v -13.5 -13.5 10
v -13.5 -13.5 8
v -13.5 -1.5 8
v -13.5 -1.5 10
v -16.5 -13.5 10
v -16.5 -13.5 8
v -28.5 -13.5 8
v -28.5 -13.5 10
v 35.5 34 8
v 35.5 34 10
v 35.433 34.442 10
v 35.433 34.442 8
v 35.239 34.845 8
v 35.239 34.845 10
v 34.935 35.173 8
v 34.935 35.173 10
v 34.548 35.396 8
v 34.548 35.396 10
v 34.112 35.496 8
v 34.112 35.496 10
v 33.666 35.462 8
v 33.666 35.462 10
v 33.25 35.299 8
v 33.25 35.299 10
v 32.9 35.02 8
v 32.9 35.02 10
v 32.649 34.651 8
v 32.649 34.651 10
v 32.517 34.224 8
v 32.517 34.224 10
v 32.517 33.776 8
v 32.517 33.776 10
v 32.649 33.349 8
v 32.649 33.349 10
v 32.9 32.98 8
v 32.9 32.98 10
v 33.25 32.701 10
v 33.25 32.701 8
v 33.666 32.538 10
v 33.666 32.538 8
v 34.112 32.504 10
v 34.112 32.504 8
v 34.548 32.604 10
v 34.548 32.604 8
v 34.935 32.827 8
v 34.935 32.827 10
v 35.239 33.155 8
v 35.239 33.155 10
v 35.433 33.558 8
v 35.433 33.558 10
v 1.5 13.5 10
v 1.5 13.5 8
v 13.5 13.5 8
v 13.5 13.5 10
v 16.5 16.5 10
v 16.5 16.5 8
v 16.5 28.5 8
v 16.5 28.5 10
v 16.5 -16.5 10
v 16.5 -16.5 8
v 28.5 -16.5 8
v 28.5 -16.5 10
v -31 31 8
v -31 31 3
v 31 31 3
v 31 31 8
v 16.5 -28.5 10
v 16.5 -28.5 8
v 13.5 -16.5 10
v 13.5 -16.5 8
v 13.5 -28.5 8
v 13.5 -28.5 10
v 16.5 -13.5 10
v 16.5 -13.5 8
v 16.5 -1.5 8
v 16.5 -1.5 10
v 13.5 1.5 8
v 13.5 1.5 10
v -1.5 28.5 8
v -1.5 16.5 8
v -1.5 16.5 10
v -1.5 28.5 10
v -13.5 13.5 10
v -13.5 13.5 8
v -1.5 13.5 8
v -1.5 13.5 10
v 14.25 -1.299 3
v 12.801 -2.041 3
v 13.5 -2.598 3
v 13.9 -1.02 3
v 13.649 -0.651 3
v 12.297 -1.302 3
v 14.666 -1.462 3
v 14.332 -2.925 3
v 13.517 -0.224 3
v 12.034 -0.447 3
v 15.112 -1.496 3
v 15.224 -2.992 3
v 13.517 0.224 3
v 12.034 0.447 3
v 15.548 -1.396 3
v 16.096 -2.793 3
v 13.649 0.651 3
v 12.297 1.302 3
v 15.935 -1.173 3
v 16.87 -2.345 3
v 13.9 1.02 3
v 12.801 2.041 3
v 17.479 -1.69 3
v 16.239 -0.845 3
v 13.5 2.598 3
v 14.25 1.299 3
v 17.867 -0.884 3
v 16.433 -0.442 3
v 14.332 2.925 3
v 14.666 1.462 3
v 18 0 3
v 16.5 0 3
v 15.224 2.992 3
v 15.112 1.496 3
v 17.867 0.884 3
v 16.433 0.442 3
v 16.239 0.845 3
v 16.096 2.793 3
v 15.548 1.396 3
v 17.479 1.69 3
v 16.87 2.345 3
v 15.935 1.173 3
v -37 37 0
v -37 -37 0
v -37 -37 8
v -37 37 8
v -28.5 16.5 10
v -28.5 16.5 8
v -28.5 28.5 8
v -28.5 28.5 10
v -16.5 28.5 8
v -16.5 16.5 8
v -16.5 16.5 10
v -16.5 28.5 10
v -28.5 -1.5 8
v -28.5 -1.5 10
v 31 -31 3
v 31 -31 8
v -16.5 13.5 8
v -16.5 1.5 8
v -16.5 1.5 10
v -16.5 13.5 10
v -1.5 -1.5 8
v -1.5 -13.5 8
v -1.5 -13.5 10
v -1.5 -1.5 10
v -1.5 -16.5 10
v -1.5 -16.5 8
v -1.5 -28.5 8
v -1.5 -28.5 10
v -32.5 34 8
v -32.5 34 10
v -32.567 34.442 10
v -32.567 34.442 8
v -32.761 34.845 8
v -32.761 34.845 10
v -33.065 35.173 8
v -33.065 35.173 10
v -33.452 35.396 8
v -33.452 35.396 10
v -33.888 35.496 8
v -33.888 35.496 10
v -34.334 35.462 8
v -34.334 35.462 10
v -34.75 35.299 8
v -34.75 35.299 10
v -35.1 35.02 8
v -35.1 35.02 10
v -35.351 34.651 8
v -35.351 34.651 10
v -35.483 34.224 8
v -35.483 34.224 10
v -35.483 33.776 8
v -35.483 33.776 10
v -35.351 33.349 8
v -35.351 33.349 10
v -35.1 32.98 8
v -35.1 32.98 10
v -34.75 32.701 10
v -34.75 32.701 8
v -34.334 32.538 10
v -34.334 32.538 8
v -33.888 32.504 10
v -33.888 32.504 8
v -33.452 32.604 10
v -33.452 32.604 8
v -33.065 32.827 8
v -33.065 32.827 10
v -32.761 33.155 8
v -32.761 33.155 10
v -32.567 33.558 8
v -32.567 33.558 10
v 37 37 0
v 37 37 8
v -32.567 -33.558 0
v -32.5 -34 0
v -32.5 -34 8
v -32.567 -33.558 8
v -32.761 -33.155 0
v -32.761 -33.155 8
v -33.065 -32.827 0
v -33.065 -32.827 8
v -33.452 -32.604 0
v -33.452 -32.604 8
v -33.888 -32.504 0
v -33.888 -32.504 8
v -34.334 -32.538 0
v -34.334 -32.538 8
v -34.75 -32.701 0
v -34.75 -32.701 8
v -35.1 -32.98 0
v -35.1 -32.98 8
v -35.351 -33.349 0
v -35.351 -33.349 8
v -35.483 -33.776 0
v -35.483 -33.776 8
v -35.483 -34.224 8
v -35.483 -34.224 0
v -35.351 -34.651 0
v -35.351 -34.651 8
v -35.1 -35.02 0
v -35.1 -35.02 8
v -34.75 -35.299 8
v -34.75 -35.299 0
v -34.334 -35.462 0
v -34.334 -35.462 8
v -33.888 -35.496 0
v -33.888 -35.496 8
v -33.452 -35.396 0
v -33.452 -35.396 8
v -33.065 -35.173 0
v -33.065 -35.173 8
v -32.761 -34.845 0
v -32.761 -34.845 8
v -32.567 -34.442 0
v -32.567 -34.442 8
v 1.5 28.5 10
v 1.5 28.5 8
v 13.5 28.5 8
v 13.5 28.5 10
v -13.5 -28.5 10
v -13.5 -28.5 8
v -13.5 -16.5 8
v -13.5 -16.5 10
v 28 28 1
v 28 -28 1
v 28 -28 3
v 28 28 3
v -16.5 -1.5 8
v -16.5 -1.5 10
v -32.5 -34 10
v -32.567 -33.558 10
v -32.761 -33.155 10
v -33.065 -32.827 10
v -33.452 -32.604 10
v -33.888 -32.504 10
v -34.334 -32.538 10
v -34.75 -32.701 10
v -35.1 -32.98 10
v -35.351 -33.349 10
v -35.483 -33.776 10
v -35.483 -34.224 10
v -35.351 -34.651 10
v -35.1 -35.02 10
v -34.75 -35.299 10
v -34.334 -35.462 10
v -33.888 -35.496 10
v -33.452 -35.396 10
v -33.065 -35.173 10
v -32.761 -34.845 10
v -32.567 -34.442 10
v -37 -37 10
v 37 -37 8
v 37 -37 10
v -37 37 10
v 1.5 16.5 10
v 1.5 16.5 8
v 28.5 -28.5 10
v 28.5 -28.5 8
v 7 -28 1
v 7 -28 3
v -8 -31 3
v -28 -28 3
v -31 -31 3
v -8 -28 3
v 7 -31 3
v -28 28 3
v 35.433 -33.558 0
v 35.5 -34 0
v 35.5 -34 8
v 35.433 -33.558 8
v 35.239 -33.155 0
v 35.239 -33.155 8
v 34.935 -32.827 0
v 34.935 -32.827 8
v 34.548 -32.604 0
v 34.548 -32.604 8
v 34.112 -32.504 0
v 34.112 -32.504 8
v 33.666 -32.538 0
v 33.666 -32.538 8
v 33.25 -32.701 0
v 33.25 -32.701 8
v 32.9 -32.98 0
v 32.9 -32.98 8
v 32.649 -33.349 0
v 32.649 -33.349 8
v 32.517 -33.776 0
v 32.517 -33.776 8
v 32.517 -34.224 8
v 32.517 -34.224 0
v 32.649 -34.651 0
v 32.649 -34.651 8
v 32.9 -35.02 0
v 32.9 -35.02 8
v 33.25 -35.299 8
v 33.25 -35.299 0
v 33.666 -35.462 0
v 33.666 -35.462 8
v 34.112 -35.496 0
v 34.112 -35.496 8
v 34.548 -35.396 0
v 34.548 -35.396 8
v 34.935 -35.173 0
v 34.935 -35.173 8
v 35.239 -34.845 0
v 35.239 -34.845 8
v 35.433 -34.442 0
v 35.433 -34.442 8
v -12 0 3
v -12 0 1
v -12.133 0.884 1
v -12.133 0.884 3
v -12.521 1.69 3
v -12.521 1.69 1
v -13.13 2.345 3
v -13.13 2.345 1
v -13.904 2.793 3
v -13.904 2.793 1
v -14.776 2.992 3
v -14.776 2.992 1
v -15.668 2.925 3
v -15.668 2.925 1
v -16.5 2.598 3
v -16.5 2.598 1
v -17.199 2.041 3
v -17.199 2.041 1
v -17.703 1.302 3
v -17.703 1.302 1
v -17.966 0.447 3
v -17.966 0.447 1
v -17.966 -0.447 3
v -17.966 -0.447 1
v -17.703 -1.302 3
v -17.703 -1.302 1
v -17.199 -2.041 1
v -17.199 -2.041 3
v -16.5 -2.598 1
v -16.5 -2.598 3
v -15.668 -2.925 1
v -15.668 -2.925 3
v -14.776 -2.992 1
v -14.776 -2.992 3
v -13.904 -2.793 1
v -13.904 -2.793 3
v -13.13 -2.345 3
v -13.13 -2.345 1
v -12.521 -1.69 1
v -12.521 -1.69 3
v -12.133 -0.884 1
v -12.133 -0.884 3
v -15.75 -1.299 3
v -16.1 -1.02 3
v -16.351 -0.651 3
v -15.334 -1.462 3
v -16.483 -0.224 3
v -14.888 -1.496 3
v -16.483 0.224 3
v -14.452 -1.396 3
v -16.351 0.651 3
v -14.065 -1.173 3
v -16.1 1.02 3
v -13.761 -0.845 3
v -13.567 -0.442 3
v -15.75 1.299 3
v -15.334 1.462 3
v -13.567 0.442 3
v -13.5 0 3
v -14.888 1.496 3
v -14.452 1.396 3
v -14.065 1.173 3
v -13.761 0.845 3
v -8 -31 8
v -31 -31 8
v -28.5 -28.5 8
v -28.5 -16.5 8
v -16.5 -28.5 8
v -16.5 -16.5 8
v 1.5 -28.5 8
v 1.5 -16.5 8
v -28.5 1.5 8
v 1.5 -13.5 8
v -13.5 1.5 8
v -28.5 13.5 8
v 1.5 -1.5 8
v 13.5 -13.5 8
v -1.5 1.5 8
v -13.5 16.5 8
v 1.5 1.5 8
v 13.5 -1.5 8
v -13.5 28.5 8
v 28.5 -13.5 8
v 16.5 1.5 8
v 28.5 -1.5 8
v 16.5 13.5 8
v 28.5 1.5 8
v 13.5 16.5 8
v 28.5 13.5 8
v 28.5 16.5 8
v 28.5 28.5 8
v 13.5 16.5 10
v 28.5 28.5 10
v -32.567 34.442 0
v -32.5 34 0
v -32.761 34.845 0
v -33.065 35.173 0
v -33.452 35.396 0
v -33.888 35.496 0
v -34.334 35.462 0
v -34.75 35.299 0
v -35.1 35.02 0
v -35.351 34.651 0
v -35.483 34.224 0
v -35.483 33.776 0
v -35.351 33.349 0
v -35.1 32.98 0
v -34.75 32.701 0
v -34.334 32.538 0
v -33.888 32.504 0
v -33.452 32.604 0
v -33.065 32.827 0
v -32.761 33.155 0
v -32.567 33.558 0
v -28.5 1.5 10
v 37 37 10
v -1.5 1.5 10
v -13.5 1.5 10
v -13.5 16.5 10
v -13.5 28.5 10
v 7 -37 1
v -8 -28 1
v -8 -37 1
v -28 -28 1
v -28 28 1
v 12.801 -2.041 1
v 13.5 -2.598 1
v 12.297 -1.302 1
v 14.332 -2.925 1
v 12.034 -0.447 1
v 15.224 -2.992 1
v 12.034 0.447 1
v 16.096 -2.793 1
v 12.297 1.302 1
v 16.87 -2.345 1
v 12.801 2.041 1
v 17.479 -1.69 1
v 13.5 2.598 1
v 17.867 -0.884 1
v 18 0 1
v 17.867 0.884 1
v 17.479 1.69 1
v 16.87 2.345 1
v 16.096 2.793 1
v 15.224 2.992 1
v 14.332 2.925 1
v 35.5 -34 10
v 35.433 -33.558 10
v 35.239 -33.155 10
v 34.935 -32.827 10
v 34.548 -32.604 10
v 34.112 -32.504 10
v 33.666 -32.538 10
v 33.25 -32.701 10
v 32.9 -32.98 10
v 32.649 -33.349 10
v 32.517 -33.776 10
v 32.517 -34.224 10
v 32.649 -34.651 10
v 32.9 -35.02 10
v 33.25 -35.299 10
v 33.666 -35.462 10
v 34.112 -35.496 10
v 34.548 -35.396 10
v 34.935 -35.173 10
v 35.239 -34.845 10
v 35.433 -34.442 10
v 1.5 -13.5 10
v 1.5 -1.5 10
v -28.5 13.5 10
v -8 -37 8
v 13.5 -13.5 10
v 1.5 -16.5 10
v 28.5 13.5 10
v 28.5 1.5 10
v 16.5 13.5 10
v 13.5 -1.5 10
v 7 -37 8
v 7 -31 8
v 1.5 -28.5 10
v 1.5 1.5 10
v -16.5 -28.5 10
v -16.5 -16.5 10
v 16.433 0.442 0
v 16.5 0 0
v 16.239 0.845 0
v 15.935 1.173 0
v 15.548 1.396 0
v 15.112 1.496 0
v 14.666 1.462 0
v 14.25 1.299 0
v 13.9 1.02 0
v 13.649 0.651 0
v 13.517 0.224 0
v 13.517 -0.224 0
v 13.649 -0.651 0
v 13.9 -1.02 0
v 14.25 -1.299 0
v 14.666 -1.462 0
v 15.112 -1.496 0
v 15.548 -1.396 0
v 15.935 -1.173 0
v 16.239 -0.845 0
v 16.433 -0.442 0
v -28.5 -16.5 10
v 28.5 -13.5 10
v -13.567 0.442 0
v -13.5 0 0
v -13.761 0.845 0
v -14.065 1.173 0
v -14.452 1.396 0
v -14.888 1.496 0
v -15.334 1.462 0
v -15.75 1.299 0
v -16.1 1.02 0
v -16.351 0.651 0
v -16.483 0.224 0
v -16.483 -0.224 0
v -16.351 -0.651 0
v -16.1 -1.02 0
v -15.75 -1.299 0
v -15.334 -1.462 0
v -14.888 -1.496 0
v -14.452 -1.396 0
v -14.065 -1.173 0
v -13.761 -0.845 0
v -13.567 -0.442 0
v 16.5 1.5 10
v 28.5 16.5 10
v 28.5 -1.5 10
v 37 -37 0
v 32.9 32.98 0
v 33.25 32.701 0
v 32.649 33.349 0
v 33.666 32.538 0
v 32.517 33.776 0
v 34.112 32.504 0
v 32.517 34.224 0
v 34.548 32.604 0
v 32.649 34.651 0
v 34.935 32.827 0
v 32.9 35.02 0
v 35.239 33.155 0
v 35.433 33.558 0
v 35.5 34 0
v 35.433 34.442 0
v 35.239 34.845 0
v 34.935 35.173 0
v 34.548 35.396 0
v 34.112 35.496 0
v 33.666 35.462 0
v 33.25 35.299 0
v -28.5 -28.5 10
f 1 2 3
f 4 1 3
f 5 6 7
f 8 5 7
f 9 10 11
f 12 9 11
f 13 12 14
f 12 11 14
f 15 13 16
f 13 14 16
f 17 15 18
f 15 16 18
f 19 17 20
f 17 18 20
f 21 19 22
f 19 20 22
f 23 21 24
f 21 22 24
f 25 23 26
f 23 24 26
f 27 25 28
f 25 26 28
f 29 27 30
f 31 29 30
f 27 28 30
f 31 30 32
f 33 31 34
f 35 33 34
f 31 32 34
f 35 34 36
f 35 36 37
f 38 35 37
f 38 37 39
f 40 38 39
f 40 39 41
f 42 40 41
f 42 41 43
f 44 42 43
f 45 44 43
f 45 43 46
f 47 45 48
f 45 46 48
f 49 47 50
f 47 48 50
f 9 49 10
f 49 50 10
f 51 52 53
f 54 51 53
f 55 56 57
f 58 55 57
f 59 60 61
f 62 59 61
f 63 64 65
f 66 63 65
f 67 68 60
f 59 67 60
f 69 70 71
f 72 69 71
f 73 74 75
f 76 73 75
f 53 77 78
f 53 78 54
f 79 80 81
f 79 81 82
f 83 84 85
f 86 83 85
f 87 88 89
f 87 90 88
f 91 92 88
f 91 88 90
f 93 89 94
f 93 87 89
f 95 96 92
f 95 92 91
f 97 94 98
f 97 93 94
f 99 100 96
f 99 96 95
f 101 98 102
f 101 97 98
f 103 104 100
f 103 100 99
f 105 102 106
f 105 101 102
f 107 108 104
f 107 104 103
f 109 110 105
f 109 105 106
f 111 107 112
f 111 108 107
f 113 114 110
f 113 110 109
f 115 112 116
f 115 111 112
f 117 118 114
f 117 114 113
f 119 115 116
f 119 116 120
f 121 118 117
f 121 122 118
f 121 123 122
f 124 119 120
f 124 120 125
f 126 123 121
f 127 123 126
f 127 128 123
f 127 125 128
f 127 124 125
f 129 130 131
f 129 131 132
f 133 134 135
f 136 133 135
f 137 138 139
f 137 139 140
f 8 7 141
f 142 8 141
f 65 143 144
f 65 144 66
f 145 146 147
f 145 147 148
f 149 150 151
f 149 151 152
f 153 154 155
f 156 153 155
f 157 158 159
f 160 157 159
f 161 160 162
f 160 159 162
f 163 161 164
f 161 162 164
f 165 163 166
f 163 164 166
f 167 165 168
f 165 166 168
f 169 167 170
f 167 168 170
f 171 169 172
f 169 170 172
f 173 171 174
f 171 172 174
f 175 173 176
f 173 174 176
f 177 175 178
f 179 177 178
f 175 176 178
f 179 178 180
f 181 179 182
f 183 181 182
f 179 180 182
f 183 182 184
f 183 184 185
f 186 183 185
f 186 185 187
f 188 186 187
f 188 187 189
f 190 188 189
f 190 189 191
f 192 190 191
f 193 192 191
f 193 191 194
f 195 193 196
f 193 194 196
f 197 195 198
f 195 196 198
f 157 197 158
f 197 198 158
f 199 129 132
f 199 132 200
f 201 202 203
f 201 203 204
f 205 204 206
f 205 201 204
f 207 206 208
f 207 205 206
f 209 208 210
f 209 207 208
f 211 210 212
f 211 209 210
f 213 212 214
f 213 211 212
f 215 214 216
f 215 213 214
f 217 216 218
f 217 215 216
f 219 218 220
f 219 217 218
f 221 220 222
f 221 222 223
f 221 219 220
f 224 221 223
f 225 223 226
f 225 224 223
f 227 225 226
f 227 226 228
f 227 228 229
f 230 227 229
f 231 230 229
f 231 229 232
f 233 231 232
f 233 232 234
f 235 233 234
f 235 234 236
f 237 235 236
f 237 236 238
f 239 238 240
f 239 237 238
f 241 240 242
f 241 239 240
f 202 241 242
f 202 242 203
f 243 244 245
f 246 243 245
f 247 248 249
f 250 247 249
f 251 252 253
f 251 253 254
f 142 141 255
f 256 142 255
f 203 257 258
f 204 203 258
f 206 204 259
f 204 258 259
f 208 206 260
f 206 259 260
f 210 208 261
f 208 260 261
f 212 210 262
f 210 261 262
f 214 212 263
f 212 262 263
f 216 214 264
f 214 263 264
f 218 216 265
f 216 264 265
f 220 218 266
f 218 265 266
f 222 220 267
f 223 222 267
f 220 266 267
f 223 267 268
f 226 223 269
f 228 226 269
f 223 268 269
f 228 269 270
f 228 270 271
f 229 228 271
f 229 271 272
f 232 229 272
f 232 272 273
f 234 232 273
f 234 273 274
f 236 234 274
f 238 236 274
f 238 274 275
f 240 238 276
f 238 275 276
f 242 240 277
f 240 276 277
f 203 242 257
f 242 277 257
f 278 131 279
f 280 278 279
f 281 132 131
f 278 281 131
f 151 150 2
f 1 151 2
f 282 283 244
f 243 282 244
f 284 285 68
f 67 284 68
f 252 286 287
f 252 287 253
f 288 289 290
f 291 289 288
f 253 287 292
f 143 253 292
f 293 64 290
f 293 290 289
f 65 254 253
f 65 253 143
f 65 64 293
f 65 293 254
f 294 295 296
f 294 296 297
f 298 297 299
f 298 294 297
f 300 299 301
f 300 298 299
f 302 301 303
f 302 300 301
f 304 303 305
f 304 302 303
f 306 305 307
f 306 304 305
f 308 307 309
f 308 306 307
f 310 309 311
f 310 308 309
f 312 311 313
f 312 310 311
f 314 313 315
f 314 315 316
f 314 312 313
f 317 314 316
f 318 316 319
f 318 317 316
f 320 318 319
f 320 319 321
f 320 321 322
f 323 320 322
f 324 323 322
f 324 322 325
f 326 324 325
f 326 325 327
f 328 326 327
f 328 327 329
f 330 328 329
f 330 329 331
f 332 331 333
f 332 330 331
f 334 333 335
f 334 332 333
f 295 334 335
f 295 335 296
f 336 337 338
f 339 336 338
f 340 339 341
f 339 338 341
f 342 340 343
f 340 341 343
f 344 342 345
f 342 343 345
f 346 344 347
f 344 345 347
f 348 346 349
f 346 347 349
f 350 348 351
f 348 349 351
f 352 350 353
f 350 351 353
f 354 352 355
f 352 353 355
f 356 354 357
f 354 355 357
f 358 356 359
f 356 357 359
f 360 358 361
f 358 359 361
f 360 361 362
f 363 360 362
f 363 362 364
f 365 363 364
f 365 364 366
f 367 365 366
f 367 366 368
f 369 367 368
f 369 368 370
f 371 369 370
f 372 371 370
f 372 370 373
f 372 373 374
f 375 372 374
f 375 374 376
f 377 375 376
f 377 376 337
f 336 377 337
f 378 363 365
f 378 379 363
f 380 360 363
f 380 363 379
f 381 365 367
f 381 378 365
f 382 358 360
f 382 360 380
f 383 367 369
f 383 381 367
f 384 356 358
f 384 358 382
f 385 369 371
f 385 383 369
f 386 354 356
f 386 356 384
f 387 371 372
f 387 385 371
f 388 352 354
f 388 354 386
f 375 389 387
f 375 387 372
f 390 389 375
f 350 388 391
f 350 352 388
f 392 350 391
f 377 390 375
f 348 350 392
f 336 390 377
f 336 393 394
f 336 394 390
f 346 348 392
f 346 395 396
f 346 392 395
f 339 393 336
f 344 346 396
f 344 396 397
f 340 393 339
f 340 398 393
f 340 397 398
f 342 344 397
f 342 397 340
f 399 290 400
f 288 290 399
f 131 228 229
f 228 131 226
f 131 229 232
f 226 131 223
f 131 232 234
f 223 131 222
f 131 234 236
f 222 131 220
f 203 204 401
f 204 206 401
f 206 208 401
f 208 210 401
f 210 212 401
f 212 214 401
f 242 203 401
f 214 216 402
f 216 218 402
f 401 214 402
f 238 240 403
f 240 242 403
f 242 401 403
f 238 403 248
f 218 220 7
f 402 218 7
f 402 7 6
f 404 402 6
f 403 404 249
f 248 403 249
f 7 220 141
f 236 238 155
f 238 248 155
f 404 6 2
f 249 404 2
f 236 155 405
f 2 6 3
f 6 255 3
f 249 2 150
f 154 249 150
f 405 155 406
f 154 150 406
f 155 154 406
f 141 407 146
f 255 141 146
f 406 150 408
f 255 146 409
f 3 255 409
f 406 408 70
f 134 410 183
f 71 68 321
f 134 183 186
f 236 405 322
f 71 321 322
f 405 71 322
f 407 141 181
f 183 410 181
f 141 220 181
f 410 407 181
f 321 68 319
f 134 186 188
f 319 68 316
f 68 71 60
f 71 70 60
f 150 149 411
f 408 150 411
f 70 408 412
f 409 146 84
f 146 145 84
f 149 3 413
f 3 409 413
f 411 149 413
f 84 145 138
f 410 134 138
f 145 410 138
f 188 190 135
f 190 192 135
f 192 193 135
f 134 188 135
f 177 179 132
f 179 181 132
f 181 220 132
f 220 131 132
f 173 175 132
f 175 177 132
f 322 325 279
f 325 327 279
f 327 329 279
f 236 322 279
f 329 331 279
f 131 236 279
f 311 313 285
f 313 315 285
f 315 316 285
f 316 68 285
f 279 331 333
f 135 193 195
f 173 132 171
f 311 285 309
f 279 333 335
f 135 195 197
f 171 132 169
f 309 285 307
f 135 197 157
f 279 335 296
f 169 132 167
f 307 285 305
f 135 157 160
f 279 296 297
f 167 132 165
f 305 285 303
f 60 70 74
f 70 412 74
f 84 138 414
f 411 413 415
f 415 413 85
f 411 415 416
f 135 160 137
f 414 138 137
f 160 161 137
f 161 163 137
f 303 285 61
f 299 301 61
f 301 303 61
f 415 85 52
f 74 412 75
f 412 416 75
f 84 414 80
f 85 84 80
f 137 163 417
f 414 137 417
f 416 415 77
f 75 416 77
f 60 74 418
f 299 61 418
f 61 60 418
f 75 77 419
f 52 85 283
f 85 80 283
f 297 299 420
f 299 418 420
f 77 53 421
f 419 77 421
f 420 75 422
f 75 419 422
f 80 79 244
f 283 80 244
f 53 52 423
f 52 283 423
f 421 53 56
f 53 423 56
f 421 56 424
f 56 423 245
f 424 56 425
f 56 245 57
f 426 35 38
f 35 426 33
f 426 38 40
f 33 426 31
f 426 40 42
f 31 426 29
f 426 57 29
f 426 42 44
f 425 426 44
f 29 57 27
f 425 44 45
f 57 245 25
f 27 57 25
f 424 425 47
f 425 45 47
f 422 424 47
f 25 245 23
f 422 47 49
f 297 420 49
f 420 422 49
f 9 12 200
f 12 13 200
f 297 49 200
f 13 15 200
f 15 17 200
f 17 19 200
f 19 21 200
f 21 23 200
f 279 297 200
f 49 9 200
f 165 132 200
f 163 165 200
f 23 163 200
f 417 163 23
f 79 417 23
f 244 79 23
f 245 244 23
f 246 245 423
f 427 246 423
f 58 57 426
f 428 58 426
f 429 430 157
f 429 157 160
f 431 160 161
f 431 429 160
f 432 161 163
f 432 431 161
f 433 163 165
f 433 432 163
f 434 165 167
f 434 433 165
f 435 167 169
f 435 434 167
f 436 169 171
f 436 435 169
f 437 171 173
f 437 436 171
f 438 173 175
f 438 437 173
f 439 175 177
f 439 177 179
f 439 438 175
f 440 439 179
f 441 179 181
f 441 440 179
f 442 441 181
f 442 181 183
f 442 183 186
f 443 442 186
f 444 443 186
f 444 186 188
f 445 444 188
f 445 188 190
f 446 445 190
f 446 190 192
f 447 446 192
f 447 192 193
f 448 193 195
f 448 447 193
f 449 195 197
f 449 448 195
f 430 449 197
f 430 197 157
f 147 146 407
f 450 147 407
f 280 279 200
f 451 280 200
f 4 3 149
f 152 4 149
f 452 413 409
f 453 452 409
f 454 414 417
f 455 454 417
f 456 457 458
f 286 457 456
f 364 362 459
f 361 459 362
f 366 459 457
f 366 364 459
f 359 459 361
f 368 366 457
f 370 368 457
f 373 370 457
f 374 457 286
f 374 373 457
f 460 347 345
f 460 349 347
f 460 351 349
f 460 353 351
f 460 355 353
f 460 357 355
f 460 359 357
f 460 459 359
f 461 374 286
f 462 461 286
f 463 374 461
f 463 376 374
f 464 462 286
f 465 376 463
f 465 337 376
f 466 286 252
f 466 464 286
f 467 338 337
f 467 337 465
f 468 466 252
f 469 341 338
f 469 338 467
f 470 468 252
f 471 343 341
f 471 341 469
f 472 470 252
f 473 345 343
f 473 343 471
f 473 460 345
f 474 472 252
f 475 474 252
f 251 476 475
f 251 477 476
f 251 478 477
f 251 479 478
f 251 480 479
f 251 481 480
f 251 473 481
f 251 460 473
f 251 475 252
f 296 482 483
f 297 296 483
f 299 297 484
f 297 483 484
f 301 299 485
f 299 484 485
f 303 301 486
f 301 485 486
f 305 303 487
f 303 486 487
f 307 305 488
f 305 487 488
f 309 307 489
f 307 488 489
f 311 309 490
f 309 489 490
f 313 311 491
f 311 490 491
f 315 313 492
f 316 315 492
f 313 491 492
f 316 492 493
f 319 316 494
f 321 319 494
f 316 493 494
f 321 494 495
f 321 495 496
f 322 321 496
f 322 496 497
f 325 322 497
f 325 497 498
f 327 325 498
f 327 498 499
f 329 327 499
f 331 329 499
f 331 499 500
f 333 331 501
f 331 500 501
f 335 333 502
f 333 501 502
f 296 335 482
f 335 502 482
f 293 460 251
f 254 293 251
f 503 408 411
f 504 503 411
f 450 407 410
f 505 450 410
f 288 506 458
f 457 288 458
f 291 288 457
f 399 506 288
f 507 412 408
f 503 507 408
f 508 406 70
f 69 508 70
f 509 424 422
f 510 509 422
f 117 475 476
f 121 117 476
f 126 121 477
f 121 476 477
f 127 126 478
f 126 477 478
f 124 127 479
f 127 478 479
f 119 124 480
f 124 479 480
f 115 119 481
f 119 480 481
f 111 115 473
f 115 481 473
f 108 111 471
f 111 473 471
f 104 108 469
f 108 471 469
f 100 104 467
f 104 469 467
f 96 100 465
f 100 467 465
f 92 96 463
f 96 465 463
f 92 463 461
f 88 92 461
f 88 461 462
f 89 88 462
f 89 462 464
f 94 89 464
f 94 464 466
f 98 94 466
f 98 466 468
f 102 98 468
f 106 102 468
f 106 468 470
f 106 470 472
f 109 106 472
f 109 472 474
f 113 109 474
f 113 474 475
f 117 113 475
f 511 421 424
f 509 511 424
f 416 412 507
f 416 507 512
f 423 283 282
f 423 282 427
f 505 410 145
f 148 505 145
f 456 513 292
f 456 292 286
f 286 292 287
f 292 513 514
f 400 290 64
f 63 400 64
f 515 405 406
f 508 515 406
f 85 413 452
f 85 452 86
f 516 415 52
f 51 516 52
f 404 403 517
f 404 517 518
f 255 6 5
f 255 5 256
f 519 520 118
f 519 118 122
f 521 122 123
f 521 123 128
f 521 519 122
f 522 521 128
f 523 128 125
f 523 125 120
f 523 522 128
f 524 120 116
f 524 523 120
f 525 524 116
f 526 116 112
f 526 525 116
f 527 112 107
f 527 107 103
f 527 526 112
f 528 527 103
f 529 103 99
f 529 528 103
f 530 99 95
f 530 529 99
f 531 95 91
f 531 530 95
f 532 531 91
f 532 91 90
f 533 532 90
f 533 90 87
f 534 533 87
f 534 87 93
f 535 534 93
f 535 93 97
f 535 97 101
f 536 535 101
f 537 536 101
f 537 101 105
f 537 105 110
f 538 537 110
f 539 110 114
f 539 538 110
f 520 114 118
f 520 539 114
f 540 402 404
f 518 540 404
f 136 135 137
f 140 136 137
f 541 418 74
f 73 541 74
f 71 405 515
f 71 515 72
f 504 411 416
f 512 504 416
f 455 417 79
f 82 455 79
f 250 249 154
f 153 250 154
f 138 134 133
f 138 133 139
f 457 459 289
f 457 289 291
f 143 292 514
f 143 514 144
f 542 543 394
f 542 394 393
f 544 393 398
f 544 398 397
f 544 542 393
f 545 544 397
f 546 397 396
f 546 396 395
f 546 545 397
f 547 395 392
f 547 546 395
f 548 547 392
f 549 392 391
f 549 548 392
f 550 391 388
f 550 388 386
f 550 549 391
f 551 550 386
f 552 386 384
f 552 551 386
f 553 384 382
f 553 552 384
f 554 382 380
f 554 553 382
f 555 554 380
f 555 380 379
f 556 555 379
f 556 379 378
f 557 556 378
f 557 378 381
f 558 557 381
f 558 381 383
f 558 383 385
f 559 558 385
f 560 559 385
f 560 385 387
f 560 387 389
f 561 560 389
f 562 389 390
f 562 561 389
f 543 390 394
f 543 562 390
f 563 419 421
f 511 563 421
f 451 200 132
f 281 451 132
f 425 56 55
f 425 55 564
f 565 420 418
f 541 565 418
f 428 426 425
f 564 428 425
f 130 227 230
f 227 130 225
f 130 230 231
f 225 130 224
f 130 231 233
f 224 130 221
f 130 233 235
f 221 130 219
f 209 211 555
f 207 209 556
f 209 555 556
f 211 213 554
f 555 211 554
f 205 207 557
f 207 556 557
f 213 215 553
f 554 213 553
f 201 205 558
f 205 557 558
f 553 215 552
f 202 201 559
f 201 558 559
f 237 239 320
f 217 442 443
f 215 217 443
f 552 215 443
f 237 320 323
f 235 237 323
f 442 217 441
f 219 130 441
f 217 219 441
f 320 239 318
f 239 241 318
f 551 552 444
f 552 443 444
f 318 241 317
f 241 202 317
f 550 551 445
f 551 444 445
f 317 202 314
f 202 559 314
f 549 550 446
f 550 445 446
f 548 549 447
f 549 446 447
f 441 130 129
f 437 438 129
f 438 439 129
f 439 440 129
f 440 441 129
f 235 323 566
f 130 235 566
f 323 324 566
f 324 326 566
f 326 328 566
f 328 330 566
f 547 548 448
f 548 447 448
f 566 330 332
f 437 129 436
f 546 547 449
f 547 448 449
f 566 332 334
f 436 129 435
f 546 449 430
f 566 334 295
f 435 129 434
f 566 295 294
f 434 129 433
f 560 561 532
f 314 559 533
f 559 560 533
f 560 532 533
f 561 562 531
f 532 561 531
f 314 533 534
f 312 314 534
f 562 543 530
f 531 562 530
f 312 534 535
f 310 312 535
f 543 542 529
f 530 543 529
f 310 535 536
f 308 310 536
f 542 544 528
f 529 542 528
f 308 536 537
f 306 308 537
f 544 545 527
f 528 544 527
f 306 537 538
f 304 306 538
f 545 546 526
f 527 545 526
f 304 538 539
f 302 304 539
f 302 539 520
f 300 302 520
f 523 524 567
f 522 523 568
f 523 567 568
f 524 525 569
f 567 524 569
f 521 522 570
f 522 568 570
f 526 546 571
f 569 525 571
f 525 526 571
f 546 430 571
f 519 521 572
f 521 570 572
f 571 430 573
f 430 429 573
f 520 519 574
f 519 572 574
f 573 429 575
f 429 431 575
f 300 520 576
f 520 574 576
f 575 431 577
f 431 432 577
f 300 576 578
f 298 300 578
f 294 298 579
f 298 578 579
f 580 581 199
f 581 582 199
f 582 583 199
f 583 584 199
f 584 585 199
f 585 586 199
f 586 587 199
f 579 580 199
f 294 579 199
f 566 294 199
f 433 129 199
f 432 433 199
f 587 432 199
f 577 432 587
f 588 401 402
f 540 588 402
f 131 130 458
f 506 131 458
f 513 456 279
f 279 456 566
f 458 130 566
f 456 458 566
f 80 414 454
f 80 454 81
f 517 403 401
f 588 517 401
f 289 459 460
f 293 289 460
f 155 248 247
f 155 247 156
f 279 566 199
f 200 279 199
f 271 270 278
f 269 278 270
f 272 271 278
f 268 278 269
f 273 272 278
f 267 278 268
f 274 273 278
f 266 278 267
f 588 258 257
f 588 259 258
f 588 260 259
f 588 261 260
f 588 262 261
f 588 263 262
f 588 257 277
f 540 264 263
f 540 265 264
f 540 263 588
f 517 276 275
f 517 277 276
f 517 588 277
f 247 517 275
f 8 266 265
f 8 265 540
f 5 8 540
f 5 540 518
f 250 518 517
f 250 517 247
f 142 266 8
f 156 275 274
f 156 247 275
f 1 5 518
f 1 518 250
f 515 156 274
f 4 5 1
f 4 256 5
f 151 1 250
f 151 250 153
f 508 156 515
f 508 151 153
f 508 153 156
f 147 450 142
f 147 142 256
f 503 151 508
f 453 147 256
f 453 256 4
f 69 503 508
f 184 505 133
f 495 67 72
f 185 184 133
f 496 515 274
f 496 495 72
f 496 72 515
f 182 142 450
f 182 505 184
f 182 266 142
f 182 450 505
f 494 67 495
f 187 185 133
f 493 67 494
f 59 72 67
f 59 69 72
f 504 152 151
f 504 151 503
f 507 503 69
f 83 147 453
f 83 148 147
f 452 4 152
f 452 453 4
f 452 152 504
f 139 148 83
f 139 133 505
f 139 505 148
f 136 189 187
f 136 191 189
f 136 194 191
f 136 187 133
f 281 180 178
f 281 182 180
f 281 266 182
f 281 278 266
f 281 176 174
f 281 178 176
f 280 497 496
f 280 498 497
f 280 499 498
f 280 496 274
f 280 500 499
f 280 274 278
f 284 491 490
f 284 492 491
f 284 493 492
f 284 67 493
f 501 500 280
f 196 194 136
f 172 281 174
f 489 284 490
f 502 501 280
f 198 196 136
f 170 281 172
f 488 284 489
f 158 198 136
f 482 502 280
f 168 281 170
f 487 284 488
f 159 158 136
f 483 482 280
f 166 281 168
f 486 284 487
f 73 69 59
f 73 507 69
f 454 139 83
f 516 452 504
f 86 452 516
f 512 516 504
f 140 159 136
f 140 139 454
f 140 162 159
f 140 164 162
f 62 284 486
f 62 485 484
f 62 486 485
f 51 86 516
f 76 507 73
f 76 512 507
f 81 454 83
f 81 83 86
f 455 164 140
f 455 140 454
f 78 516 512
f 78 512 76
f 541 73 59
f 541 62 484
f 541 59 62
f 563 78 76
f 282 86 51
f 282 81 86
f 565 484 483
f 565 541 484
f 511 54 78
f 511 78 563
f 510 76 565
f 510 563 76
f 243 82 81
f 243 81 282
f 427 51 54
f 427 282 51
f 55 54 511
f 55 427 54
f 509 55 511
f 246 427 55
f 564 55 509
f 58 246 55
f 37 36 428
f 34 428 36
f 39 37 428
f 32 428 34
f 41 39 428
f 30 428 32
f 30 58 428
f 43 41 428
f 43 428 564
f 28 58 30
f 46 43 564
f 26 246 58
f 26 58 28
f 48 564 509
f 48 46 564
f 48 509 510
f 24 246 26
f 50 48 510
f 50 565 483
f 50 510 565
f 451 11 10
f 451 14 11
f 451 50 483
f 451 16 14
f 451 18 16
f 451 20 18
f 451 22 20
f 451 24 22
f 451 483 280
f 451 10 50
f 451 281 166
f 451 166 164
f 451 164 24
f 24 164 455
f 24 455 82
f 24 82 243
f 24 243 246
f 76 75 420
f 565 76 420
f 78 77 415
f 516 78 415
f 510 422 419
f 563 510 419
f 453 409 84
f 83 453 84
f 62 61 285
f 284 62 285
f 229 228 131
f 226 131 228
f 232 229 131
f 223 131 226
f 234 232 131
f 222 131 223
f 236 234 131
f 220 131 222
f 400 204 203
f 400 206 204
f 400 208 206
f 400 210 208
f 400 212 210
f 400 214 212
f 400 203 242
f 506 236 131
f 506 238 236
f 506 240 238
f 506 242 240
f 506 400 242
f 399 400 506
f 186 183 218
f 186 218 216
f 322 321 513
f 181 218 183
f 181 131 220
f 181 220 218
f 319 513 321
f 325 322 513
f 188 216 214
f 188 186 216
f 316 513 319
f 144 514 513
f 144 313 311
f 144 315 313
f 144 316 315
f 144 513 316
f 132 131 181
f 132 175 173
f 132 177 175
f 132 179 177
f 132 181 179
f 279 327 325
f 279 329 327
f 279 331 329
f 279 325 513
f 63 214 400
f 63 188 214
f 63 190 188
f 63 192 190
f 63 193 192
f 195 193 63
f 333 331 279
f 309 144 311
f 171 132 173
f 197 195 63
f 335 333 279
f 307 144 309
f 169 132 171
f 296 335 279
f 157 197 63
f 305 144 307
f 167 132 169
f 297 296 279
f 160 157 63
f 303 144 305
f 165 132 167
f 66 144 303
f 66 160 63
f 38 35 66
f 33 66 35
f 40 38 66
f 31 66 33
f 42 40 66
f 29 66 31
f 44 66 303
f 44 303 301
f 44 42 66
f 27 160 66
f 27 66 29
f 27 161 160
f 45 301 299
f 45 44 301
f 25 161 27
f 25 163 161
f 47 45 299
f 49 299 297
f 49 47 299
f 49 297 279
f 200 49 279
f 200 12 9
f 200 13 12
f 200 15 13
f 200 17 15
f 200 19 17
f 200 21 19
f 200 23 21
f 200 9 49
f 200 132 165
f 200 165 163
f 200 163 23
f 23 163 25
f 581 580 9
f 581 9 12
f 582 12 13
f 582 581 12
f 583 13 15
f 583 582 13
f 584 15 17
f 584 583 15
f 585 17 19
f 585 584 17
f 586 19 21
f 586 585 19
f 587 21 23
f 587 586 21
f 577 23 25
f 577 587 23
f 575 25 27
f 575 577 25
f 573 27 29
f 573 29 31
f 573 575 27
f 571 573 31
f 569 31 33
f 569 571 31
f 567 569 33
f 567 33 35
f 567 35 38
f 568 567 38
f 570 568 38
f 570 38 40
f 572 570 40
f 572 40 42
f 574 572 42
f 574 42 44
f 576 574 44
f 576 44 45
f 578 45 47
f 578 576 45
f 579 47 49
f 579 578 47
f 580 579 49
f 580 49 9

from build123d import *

# Parameters (mm, degrees)
F0_W      = 74
F0_H      = 74
F0_R      = 1.5
F0_W_2    = 62
F0_H_2    = 62
F1_DEPTH  = 8
F0_W_3    = 56
F0_H_3    = 56
F2_DEPTH  = 2
F0_R_2    = 3
F3_DEPTH  = 1
F4_DEPTH  = 3
F5_DEPTH  = 3
F7_R      = 1.5
F7_W      = 12
F7_H      = 6
F7_W_2    = 3
F7_H_2    = 2.5
F7_W_3    = 6
F7_H_3    = 3
F7_W_4    = 2.5
F7_H_4    = 12
F8_DEPTH  = 2
F9_R      = 1.5
F10_DEPTH = 2
F6_W      = 7.5
F6_H      = 9.0005761179
F11_DEPTH = 7


with BuildPart() as f1:
    # F0 (on Top) → F1 (new body)
    with BuildSketch(Plane.XY):
        Rectangle(F0_W, F0_H)
        with Locations((-34, -34)):
            Circle(F0_R, mode=Mode.SUBTRACT)
        with Locations((34, -34)):
            Circle(F0_R, mode=Mode.SUBTRACT)
        with Locations((-34, 34)):
            Circle(F0_R, mode=Mode.SUBTRACT)
        Rectangle(F0_W_2, F0_H_2, mode=Mode.SUBTRACT)
        with Locations((34, 34)):
            Circle(F0_R, mode=Mode.SUBTRACT)
    extrude(amount=F1_DEPTH)

    # F0 (on Top) → F2 (join)
    with BuildSketch(Plane.XY):
        Rectangle(F0_W_2, F0_H_2)
        Rectangle(F0_W_3, F0_H_3, mode=Mode.SUBTRACT)
    extrude(amount=F2_DEPTH)

    # F0 (on Top) → F3 (join)
    with BuildSketch(Plane.XY):
        Rectangle(F0_W_3, F0_H_3)
        with Locations((-15, 0)):
            Circle(F0_R_2, mode=Mode.SUBTRACT)
        with Locations((15, 0)):
            Circle(F0_R_2, mode=Mode.SUBTRACT)
    extrude(amount=F3_DEPTH)

    # F0 (on Top) → F4 (join)
    with BuildSketch(Plane.XY):
        with Locations((-15, 0)):
            Circle(F0_R_2)
        with Locations((-15, 0)):
            Circle(F0_R, mode=Mode.SUBTRACT)
        with Locations((15, 0)):
            Circle(F0_R_2)
        with Locations((15, 0)):
            Circle(F0_R, mode=Mode.SUBTRACT)
    extrude(amount=F4_DEPTH)

    # F0 (on Top) → F5 (join)
    with BuildSketch(Plane.XY):
        Rectangle(F0_W_2, F0_H_2)
        Rectangle(F0_W_3, F0_H_3, mode=Mode.SUBTRACT)
    extrude(amount=F5_DEPTH)

    # F6 (on face) → F11 (cut)
    with BuildSketch(Plane.XY.offset(8)):
        with Locations((3.25, -32.500288059)):
            Rectangle(F6_W, F6_H)
        with Locations((-4.25, -32.500288059)):
            Rectangle(F6_W, F6_H)
    extrude(amount=-F11_DEPTH, mode=Mode.SUBTRACT)


with BuildPart() as f8:
    # F7 (on face) → F8 (new body)
    with BuildSketch(Plane.XY.offset(8)):
        Polygon((-16.5, 37), (-37, 37), (-37, 16.5), (-31, 16.5), (-31, 31), (-16.5, 31), align=None)
        with Locations((-34, 34)):
            Circle(F7_R, mode=Mode.SUBTRACT)
        with Locations((-7.5, 34)):
            Rectangle(F7_W, F7_H)
        with Locations((-15, 34)):
            Rectangle(F7_W_2, F7_H)
        with Locations((0, 34)):
            Rectangle(F7_W_2, F7_H)
        with Locations((7.5, 34)):
            Rectangle(F7_W, F7_H)
        with Locations((15, 34)):
            Rectangle(F7_W_2, F7_H)
        Polygon((37, 37), (16.5, 37), (16.5, 31), (31, 31), (31, 16.5), (37, 16.5), align=None)
        with Locations((34, 34)):
            Circle(F7_R, mode=Mode.SUBTRACT)
        Polygon((31, 31), (16.5, 31), (16.5, 28.5), (28.5, 28.5), (28.5, 16.5), (31, 16.5), align=None)
        with Locations((15, 29.75)):
            Rectangle(F7_W_2, F7_H_2)
        with Locations((7.5, 29.75)):
            Rectangle(F7_W, F7_H_2)
        with Locations((0, 29.75)):
            Rectangle(F7_W_2, F7_H_2)
        with Locations((-7.5, 29.75)):
            Rectangle(F7_W, F7_H_2)
        with Locations((-15, 29.75)):
            Rectangle(F7_W_2, F7_H_2)
        Polygon((-16.5, 28.5), (-16.5, 31), (-31, 31), (-31, 16.5), (-28.5, 16.5), (-28.5, 28.5), align=None)
        with Locations((-34, 15)):
            Rectangle(F7_W_3, F7_H_3)
        with Locations((-29.75, 15)):
            Rectangle(F7_W_4, F7_H_3)
        with Locations((-34, 0)):
            Rectangle(F7_W_3, F7_H_3)
        with Locations((-29.75, 0)):
            Rectangle(F7_W_4, F7_H_3)
        with Locations((-34, 7.5)):
            Rectangle(F7_W_3, F7_H_4)
        with Locations((-29.75, 7.5)):
            Rectangle(F7_W_4, F7_H_4)
        with Locations((-34, -7.5)):
            Rectangle(F7_W_3, F7_H_4)
        with Locations((-29.75, -7.5)):
            Rectangle(F7_W_4, F7_H_4)
        with Locations((-34, -15)):
            Rectangle(F7_W_3, F7_H_3)
        with Locations((-29.75, -15)):
            Rectangle(F7_W_4, F7_H_3)
        Polygon((-31, -16.5), (-37, -16.5), (-37, -37), (-16.5, -37), (-16.5, -31), (-31, -31), align=None)
        with Locations((-34, -34)):
            Circle(F7_R, mode=Mode.SUBTRACT)
        Polygon((-28.5, -16.5), (-31, -16.5), (-31, -31), (-16.5, -31), (-16.5, -28.5), (-28.5, -28.5), align=None)
        with Locations((-15, -34)):
            Rectangle(F7_W_2, F7_H)
        with Locations((-15, -29.75)):
            Rectangle(F7_W_2, F7_H_2)
        with Locations((0, -34)):
            Rectangle(F7_W_2, F7_H)
        with Locations((15, -34)):
            Rectangle(F7_W_2, F7_H)
        with Locations((15, -29.75)):
            Rectangle(F7_W_2, F7_H_2)
        Polygon((37, -37), (37, -16.5), (31, -16.5), (31, -31), (16.5, -31), (16.5, -37), align=None)
        with Locations((34, -34)):
            Circle(F7_R, mode=Mode.SUBTRACT)
        with Locations((34, -34)):
            Circle(F7_R)
        Polygon((31, -31), (31, -16.5), (28.5, -16.5), (28.5, -28.5), (16.5, -28.5), (16.5, -31), align=None)
        with Locations((34, -15)):
            Rectangle(F7_W_3, F7_H_3)
        with Locations((29.75, -15)):
            Rectangle(F7_W_4, F7_H_3)
        with Locations((34, -7.5)):
            Rectangle(F7_W_3, F7_H_4)
        with Locations((29.75, -7.5)):
            Rectangle(F7_W_4, F7_H_4)
        with Locations((29.75, 0)):
            Rectangle(F7_W_4, F7_H_3)
        with Locations((34, 0)):
            Rectangle(F7_W_3, F7_H_3)
        with Locations((34, 7.5)):
            Rectangle(F7_W_3, F7_H_4)
        with Locations((29.75, 7.5)):
            Rectangle(F7_W_4, F7_H_4)
        with Locations((34, 15)):
            Rectangle(F7_W_3, F7_H_3)
        with Locations((29.75, 15)):
            Rectangle(F7_W_4, F7_H_3)
        with Locations((22.5, 15)):
            Rectangle(F7_W, F7_H_3)
        with Locations((15, 22.5)):
            Rectangle(F7_W_2, F7_H_4)
        with Locations((15, 15)):
            Rectangle(F7_W_2, F7_H_3)
        with Locations((-22.5, 15)):
            Rectangle(F7_W, F7_H_3)
        with Locations((-15, 22.5)):
            Rectangle(F7_W_2, F7_H_4)
        with Locations((-15, 15)):
            Rectangle(F7_W_2, F7_H_3)
        with Locations((-7.5, 15)):
            Rectangle(F7_W, F7_H_3)
        with Locations((0, 22.5)):
            Rectangle(F7_W_2, F7_H_4)
        with Locations((0, 15)):
            Rectangle(F7_W_2, F7_H_3)
        with Locations((-22.5, 0)):
            Rectangle(F7_W, F7_H_3)
        with Locations((-15, 0)):
            Rectangle(F7_W_2, F7_H_3)
        with Locations((-7.5, 0)):
            Rectangle(F7_W, F7_H_3)
        Rectangle(F7_W_2, F7_H_3)
        with Locations((7.5, 0)):
            Rectangle(F7_W, F7_H_3)
        with Locations((15, 0)):
            Rectangle(F7_W_2, F7_H_3)
        with Locations((22.5, 0)):
            Rectangle(F7_W, F7_H_3)
        with Locations((7.5, 15)):
            Rectangle(F7_W, F7_H_3)
        with Locations((15, 7.5)):
            Rectangle(F7_W_2, F7_H_4)
        with Locations((0, 7.5)):
            Rectangle(F7_W_2, F7_H_4)
        with Locations((-15, 7.5)):
            Rectangle(F7_W_2, F7_H_4)
        with Locations((-22.5, -15)):
            Rectangle(F7_W, F7_H_3)
        with Locations((-15, -22.5)):
            Rectangle(F7_W_2, F7_H_4)
        with Locations((-15, -15)):
            Rectangle(F7_W_2, F7_H_3)
        with Locations((0, -22.5)):
            Rectangle(F7_W_2, F7_H_4)
        with Locations((0, -15)):
            Rectangle(F7_W_2, F7_H_3)
        with Locations((7.5, -15)):
            Rectangle(F7_W, F7_H_3)
        with Locations((-7.5, -15)):
            Rectangle(F7_W, F7_H_3)
        with Locations((15, -22.5)):
            Rectangle(F7_W_2, F7_H_4)
        with Locations((15, -15)):
            Rectangle(F7_W_2, F7_H_3)
        with Locations((22.5, -15)):
            Rectangle(F7_W, F7_H_3)
        with Locations((15, -7.5)):
            Rectangle(F7_W_2, F7_H_4)
        with Locations((0, -7.5)):
            Rectangle(F7_W_2, F7_H_4)
        with Locations((-15, -7.5)):
            Rectangle(F7_W_2, F7_H_4)
        with Locations((-34, -34)):
            Circle(F7_R)
        with Locations((-34, 34)):
            Circle(F7_R)
        with Locations((34, 34)):
            Circle(F7_R)
        with Locations((-7.5, -34)):
            Rectangle(F7_W, F7_H)
        with Locations((7.5, -34)):
            Rectangle(F7_W, F7_H)
        with Locations((7.5, -29.75)):
            Rectangle(F7_W, F7_H_2)
        with Locations((0, -29.75)):
            Rectangle(F7_W_2, F7_H_2)
        with Locations((-7.5, -29.75)):
            Rectangle(F7_W, F7_H_2)
    extrude(amount=F8_DEPTH)

    # F9 (on face) → F10 (cut)
    with BuildSketch(Plane.XY.offset(10)):
        with Locations((-34, -34)):
            Circle(F9_R)
        with Locations((34, -34)):
            Circle(F9_R)
        with Locations((34, 34)):
            Circle(F9_R)
        with Locations((-34, 34)):
            Circle(F9_R)
    extrude(amount=-F10_DEPTH, mode=Mode.SUBTRACT)


solid = Compound([f1.part, f8.part])
